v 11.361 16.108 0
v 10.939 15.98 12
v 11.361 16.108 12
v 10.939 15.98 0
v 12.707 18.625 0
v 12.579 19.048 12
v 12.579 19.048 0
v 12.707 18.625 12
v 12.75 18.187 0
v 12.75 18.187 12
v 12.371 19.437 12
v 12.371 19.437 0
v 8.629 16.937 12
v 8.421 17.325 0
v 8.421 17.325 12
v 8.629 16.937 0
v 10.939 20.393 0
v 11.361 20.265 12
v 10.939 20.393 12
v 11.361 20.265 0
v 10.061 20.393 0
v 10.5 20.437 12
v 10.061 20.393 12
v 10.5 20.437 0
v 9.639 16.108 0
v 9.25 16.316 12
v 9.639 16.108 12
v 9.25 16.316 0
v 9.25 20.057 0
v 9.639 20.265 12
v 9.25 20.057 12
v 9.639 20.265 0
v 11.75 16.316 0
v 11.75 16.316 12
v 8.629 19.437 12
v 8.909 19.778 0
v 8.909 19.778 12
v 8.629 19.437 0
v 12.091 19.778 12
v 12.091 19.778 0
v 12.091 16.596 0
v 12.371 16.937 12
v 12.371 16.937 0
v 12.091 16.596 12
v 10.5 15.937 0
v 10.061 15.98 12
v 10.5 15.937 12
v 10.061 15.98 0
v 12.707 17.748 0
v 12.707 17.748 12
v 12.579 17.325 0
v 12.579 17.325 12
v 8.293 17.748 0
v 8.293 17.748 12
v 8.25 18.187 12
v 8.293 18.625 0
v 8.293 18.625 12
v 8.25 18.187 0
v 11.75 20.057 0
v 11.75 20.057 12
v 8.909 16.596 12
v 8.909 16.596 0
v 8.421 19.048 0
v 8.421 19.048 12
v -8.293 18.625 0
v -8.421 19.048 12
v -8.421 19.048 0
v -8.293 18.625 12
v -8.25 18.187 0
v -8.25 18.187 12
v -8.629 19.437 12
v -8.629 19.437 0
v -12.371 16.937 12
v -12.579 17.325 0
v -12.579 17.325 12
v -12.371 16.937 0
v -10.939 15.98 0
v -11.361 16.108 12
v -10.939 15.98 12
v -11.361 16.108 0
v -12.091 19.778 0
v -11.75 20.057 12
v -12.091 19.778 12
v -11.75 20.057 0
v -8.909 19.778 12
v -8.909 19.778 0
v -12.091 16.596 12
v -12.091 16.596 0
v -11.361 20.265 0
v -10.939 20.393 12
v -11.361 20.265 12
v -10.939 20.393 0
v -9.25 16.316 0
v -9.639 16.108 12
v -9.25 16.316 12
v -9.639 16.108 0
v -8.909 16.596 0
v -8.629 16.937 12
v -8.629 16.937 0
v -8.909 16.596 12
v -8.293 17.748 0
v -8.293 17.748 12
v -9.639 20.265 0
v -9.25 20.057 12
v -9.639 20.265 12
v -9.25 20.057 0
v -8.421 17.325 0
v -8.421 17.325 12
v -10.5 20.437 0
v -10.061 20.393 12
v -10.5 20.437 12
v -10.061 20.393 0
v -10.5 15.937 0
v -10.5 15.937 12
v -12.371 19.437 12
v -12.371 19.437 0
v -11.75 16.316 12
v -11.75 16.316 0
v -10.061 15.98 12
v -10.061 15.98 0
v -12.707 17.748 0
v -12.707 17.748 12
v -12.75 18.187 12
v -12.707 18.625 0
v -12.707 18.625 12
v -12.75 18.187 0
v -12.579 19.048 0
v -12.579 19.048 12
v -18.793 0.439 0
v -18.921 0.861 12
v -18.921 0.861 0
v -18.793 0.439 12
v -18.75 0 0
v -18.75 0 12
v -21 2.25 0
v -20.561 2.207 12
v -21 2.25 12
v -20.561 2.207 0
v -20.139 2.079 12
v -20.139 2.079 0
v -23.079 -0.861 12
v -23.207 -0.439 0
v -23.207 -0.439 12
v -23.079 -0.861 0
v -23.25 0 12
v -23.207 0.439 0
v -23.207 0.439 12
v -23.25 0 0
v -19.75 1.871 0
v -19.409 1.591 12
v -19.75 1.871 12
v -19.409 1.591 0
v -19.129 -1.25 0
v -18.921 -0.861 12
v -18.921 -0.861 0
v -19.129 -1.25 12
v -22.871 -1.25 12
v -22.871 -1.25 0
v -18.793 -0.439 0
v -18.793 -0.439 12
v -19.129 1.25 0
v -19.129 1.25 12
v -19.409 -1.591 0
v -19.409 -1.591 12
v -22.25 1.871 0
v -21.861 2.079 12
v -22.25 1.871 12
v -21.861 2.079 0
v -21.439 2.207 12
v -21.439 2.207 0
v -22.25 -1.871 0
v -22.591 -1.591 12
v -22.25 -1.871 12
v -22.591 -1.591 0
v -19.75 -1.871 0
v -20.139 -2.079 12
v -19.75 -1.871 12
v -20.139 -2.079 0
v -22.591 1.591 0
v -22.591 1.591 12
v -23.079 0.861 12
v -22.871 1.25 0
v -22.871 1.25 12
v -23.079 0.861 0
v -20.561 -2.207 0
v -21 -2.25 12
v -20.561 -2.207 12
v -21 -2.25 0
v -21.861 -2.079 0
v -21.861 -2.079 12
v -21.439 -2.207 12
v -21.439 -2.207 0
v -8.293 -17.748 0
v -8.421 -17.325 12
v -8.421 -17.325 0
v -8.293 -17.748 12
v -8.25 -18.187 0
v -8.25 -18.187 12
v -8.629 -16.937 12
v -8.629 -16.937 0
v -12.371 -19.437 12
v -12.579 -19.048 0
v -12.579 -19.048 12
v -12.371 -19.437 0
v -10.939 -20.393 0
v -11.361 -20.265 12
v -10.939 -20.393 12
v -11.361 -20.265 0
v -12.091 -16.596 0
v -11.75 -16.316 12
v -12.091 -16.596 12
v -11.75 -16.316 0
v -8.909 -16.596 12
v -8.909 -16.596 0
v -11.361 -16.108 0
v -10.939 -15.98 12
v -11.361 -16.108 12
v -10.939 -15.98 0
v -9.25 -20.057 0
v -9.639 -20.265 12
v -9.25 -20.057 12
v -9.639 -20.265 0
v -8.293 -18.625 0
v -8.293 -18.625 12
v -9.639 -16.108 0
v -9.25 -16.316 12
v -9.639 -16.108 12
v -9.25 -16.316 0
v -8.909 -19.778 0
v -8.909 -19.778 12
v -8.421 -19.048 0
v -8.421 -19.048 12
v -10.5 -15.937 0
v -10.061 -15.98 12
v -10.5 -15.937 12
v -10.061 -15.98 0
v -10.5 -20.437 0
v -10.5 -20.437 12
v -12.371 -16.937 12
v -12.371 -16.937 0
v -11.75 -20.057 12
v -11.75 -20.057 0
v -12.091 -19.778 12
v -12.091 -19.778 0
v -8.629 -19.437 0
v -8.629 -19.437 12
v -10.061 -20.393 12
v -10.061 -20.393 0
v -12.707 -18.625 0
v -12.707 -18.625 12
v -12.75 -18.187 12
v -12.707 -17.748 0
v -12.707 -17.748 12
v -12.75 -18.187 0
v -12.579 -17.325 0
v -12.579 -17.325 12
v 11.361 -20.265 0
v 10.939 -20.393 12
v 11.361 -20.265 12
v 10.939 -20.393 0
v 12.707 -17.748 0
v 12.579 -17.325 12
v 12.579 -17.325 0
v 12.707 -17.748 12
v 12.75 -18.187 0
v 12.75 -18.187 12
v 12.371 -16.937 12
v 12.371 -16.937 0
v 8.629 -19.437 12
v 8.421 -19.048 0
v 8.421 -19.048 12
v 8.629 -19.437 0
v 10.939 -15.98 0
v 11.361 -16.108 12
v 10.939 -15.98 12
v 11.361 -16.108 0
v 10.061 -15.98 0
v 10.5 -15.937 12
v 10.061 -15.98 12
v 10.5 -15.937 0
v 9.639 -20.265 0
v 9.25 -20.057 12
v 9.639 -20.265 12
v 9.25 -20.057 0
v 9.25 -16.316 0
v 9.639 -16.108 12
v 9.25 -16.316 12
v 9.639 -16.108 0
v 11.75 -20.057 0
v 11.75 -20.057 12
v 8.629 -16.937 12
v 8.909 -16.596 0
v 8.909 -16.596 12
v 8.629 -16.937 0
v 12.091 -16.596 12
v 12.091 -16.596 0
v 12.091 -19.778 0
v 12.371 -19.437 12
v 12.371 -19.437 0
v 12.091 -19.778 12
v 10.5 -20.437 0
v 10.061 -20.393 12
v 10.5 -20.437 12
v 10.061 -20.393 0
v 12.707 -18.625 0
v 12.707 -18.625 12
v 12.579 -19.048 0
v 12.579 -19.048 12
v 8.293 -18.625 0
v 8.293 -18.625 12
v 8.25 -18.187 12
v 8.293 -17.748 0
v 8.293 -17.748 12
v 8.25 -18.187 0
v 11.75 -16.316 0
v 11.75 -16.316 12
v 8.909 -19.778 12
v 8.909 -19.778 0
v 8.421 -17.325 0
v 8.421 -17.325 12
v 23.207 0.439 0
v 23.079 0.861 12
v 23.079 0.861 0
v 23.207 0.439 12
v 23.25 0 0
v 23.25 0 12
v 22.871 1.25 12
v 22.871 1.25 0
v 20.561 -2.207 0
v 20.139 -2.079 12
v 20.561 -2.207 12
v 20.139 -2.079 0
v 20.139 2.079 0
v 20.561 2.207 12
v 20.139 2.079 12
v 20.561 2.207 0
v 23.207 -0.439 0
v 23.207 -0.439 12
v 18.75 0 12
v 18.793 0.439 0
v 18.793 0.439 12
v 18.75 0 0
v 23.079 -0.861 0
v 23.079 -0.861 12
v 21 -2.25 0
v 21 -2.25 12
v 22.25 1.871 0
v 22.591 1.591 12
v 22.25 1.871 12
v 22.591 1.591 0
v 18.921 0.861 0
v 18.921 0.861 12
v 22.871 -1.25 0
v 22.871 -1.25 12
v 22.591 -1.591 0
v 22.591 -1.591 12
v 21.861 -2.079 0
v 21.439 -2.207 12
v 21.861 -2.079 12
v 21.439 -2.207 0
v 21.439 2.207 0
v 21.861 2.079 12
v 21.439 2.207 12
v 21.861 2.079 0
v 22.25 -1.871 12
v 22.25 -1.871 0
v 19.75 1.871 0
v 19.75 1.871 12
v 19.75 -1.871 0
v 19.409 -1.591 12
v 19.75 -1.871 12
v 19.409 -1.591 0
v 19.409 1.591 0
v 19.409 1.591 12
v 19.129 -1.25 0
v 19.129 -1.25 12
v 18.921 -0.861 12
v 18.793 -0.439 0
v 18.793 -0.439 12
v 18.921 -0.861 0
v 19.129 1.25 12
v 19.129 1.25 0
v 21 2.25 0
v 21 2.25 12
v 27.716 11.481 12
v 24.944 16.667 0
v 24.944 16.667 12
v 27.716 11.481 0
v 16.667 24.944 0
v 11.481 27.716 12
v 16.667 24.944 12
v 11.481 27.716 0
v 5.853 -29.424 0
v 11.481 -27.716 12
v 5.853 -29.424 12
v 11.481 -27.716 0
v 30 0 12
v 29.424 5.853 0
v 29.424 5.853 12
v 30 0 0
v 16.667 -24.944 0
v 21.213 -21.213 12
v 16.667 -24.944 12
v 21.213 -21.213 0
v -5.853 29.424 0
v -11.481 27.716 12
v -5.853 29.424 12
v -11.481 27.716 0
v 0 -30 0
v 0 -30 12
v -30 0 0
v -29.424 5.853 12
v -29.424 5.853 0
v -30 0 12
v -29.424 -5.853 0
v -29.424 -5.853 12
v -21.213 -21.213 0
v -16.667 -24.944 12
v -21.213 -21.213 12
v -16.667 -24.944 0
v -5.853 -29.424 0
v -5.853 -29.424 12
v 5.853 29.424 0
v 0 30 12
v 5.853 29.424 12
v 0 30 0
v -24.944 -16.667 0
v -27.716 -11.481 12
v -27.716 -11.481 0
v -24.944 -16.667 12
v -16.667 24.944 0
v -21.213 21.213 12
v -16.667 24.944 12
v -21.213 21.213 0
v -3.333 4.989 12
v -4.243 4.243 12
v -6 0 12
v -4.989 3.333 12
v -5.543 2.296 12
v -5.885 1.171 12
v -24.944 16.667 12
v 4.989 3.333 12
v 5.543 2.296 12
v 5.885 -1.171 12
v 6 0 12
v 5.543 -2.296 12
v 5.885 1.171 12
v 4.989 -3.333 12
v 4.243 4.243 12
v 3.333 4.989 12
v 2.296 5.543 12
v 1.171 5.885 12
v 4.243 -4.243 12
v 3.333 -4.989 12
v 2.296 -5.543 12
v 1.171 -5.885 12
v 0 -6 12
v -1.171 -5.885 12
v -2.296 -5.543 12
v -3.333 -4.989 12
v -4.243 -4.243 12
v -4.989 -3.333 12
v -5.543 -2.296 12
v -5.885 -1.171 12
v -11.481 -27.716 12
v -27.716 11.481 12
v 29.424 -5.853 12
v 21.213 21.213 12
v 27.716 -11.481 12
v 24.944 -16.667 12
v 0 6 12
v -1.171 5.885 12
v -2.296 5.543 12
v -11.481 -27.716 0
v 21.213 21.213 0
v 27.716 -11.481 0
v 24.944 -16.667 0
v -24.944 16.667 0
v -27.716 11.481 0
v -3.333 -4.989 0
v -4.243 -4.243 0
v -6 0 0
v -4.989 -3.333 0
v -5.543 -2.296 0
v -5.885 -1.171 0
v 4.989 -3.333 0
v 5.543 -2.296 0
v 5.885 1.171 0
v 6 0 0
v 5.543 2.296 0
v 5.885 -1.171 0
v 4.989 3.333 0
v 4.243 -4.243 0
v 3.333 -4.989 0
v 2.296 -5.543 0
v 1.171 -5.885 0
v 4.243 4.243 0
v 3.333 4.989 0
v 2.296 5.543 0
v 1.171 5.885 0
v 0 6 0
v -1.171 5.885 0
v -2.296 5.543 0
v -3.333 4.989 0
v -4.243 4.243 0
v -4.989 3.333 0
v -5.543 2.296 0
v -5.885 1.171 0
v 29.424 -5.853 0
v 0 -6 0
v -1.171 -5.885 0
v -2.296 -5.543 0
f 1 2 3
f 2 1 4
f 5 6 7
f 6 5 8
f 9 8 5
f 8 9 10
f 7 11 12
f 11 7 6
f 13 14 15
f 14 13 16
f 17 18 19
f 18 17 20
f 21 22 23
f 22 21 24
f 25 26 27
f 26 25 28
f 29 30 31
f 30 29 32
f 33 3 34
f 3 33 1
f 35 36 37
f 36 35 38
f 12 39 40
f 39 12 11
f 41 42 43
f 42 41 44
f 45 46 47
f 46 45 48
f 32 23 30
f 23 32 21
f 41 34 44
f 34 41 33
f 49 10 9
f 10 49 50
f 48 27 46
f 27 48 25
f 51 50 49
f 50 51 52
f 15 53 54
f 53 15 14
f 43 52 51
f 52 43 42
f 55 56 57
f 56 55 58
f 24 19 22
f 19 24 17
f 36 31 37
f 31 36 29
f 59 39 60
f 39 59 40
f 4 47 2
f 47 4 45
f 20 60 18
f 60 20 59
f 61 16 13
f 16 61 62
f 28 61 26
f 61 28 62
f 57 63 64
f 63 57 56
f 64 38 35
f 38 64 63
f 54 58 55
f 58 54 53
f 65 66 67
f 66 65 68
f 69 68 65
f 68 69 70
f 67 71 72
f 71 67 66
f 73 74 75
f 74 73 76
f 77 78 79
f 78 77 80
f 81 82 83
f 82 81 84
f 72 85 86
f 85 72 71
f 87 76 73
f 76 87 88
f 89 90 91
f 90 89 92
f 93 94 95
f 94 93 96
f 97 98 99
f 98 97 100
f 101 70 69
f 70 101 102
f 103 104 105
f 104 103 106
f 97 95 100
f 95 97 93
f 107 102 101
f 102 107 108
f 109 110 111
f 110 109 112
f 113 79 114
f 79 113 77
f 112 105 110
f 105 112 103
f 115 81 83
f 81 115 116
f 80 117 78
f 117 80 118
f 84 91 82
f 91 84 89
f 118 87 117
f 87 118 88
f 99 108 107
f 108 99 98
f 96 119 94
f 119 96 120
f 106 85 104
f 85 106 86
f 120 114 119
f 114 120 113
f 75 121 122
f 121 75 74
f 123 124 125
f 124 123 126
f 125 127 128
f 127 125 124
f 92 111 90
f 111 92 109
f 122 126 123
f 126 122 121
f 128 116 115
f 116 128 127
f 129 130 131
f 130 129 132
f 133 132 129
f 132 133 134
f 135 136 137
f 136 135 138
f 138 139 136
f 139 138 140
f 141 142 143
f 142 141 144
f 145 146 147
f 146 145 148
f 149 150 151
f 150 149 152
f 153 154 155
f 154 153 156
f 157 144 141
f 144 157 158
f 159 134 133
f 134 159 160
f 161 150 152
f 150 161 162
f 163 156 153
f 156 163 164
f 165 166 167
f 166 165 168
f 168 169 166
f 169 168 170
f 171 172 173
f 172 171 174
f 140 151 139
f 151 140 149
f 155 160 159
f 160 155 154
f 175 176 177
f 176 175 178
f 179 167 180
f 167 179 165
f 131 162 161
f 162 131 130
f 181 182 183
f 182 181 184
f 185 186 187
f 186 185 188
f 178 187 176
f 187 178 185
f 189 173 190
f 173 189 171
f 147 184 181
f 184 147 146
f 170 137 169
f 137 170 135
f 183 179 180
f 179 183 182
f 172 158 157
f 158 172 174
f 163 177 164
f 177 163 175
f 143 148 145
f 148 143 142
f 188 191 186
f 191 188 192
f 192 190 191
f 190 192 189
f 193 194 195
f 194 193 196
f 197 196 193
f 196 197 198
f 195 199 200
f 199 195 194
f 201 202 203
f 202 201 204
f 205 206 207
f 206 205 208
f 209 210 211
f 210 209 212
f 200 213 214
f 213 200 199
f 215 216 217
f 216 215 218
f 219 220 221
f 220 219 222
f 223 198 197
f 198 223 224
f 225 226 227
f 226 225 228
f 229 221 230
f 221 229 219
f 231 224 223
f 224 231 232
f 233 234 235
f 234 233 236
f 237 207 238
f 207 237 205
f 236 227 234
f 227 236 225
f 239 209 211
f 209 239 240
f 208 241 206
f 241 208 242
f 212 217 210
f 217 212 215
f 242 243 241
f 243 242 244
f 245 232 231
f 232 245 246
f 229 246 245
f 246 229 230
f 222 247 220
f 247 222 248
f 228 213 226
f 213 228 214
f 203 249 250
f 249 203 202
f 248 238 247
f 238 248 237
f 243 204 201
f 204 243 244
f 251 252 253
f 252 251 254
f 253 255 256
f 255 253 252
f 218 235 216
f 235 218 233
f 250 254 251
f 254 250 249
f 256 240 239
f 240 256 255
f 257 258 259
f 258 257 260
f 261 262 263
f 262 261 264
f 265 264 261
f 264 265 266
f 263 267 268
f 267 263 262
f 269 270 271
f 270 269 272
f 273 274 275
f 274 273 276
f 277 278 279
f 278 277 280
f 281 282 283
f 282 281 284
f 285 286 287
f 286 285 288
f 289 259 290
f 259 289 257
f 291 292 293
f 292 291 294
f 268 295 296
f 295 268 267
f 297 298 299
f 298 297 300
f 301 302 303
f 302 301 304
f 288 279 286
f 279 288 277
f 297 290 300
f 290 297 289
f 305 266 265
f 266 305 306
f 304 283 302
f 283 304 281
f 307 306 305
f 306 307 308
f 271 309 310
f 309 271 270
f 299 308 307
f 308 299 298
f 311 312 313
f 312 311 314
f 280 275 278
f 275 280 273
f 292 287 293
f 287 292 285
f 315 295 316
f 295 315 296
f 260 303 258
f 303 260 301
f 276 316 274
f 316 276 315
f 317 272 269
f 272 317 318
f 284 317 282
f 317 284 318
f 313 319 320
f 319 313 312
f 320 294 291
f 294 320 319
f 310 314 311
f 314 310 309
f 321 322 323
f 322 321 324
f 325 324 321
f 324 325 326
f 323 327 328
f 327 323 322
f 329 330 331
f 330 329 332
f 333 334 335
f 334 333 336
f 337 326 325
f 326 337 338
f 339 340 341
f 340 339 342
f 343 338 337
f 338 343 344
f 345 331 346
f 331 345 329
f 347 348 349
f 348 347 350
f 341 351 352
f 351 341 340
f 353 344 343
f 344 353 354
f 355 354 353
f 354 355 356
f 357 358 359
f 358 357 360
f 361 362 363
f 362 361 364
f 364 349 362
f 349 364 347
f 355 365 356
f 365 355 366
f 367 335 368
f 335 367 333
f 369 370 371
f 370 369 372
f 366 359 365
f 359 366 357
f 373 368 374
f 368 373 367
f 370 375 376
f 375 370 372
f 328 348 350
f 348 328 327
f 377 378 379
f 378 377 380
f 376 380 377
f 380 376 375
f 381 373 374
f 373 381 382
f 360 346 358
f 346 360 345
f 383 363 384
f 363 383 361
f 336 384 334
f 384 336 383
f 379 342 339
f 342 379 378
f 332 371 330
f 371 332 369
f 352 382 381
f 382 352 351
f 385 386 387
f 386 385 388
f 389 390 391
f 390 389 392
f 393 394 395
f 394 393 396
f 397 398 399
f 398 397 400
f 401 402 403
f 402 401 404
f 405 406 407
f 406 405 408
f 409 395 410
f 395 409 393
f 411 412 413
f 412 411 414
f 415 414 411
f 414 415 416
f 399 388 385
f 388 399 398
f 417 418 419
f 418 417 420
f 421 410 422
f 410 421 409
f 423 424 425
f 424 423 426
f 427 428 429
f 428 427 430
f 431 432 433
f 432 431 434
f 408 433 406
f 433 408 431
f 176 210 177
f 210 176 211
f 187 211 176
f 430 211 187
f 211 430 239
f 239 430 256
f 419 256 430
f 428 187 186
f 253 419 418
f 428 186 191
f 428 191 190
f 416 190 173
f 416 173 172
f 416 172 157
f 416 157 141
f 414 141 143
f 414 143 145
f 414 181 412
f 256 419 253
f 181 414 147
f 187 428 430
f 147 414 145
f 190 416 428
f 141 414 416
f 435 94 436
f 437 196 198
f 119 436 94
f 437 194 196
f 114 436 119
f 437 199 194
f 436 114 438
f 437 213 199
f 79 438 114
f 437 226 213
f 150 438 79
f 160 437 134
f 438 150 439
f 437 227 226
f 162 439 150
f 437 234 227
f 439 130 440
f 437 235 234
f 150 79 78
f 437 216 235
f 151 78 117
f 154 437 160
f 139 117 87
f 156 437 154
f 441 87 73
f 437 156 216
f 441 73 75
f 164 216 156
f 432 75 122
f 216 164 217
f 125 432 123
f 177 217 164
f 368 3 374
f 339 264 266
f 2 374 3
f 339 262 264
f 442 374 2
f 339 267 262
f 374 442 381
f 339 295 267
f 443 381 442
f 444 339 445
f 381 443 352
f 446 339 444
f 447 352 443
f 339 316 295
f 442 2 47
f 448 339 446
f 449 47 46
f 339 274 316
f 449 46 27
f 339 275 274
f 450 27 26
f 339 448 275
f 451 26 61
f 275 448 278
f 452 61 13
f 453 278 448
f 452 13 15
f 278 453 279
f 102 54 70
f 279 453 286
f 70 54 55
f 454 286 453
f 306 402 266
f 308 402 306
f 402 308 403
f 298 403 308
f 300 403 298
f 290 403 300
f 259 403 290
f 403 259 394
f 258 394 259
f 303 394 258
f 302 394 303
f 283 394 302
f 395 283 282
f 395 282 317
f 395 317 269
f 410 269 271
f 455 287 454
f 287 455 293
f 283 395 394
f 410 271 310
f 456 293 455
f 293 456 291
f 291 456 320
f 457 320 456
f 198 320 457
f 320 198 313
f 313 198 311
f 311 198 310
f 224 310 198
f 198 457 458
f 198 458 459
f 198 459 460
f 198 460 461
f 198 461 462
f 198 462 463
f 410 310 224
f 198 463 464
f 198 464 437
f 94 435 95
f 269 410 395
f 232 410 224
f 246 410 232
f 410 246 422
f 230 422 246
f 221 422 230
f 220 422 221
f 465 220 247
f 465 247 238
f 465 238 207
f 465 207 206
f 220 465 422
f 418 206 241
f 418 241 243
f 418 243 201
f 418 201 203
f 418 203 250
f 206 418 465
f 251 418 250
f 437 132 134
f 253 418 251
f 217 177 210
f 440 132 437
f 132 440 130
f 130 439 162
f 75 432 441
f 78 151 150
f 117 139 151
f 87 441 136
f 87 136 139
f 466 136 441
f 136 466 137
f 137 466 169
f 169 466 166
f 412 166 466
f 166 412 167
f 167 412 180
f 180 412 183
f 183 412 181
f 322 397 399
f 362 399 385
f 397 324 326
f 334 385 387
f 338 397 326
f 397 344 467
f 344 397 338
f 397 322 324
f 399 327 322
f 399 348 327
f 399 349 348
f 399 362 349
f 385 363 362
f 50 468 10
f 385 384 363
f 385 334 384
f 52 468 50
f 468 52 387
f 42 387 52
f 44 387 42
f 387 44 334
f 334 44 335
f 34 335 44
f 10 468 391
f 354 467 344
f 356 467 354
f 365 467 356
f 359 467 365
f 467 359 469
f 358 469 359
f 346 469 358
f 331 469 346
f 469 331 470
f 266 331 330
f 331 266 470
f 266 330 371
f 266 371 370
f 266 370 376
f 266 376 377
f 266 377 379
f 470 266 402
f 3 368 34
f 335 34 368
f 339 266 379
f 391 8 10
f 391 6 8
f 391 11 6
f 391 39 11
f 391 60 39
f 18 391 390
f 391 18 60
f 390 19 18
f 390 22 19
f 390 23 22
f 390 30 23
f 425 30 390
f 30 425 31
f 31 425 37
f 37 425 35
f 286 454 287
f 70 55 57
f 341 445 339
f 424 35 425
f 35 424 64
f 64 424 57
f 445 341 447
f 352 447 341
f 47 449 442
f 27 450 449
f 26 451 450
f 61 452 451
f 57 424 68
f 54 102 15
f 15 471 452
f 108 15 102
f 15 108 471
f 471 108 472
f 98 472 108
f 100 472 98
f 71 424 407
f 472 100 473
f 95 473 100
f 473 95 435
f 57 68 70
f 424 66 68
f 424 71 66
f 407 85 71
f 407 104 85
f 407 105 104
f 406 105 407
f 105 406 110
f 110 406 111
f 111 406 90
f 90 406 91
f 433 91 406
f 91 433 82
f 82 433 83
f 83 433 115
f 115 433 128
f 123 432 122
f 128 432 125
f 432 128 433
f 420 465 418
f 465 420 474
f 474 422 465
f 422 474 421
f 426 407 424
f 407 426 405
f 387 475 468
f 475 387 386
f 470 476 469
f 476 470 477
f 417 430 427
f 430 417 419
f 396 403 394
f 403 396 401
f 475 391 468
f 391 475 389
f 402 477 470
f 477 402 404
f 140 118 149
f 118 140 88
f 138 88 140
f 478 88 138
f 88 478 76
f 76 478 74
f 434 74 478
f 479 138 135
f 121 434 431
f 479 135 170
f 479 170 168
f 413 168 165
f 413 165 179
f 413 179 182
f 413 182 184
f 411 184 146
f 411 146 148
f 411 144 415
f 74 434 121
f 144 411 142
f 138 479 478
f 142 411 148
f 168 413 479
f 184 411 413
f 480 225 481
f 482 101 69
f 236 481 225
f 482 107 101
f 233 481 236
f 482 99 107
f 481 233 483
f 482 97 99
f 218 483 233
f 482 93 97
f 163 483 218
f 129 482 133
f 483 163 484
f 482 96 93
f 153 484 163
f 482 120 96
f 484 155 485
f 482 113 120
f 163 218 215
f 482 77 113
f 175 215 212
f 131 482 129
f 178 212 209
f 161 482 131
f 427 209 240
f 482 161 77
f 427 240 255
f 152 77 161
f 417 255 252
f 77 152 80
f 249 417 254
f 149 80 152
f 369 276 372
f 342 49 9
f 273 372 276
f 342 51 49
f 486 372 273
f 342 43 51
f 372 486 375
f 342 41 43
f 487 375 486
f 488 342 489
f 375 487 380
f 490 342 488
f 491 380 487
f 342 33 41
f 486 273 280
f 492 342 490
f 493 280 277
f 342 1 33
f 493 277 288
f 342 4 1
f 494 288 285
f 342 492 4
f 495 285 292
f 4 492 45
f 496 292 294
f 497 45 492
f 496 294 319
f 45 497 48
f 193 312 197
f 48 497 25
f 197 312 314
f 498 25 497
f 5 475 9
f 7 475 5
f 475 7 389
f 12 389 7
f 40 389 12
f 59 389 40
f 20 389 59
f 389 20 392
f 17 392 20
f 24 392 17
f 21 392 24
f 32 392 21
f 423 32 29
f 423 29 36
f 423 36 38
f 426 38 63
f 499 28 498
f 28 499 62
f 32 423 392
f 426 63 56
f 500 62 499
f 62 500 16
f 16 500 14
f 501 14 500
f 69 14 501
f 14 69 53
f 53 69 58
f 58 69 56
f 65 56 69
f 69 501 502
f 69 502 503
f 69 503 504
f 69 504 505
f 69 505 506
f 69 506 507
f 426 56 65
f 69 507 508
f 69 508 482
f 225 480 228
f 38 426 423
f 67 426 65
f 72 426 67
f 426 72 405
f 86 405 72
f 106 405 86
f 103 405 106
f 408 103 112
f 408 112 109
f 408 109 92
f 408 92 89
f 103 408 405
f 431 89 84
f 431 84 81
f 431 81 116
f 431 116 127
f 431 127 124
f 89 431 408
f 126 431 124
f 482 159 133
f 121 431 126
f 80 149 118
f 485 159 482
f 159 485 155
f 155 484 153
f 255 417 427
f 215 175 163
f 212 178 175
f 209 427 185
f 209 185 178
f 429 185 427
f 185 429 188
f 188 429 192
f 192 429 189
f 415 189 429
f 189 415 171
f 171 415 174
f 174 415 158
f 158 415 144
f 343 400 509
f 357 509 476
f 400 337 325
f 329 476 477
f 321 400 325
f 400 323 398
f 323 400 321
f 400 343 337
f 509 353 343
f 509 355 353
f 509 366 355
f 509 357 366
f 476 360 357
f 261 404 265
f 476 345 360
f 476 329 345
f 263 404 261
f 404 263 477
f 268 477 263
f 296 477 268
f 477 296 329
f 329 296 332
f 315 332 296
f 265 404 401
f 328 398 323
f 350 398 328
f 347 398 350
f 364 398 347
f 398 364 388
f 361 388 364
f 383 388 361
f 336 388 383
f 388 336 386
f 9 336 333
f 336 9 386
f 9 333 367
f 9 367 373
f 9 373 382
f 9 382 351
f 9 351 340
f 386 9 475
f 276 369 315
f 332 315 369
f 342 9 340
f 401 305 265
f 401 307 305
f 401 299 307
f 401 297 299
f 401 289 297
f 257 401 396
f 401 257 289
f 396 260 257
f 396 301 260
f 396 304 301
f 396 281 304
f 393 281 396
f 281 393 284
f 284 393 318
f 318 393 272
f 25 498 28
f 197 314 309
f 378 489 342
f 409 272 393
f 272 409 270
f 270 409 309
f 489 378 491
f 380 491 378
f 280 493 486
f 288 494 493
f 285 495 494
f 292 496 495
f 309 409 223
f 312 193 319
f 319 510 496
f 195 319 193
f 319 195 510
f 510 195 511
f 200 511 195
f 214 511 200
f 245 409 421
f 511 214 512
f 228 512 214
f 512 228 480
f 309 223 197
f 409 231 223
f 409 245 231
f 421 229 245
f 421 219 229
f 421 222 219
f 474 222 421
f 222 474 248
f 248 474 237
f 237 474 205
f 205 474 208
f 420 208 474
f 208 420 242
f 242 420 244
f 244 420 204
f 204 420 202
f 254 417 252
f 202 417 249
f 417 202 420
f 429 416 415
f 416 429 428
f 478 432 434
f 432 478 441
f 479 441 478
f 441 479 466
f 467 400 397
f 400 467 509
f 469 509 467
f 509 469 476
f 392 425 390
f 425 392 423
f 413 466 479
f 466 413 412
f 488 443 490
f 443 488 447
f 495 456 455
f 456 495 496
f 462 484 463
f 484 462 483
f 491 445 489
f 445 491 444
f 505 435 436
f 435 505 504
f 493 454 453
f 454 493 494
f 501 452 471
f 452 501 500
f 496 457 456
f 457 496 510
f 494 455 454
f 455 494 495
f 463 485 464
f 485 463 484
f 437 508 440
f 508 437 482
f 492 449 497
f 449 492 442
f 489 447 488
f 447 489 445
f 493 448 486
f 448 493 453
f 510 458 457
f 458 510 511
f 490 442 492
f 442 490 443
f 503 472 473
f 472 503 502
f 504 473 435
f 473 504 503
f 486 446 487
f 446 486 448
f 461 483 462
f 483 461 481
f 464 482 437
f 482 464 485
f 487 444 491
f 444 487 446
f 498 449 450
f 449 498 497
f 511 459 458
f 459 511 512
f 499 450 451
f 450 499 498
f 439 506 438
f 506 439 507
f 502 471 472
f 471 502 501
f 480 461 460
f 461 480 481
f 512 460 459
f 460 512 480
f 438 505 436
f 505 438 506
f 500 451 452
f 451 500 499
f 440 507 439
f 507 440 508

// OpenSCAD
$fn = 32;

// ----------------------------------------------------------------------
// Flange Ø60 x 12
// 6 holes on a Ø42 bolt circle, bolted joints
// ----------------------------------------------------------------------

// --- parameters (mm) ---
flange_d = 60;   // outside diameter of the flange
thickness = 12;  // flange thickness
holes = 6;       // number of bolt holes
pcd = 42;        // bolt circle diameter
start_deg = 60;  // angle of the first hole, from +X
hole_d = 4.5;    // bolt hole diameter
bore_d = 12;     // central through bore
hub_d = 24;      // hub outside diameter
hub_h = 0;       // hub height above the flange face (0 = no hub)

// --- derived feature positions (mm) ---
height = thickness + hub_h;  // = 12   overall height of the part
pcd_r = pcd / 2;             // = 21   bolt circle radius
hole_step = 360 / holes;     // = 60   angular pitch
feature_centers = [
  [pcd_r * cos(start_deg + 0 * hole_step), pcd_r * sin(start_deg + 0 * hole_step)],
  [pcd_r * cos(start_deg + 1 * hole_step), pcd_r * sin(start_deg + 1 * hole_step)],
  [pcd_r * cos(start_deg + 2 * hole_step), pcd_r * sin(start_deg + 2 * hole_step)],
  [pcd_r * cos(start_deg + 3 * hole_step), pcd_r * sin(start_deg + 3 * hole_step)],
  [pcd_r * cos(start_deg + 4 * hole_step), pcd_r * sin(start_deg + 4 * hole_step)],
  [pcd_r * cos(start_deg + 5 * hole_step), pcd_r * sin(start_deg + 5 * hole_step)]
];   // bolt hole centres on the pitch circle

// flange disc, every hole and the bore cut straight through
difference() {
  union() {
    cylinder(d = flange_d, h = thickness);
  }
  translate([0, 0, -1]) cylinder(d = bore_d, h = height + 2);  // bore, through
  for (centre = feature_centers)
    translate([centre[0], centre[1], -1]) cylinder(d = hole_d, h = thickness + 2);
}
